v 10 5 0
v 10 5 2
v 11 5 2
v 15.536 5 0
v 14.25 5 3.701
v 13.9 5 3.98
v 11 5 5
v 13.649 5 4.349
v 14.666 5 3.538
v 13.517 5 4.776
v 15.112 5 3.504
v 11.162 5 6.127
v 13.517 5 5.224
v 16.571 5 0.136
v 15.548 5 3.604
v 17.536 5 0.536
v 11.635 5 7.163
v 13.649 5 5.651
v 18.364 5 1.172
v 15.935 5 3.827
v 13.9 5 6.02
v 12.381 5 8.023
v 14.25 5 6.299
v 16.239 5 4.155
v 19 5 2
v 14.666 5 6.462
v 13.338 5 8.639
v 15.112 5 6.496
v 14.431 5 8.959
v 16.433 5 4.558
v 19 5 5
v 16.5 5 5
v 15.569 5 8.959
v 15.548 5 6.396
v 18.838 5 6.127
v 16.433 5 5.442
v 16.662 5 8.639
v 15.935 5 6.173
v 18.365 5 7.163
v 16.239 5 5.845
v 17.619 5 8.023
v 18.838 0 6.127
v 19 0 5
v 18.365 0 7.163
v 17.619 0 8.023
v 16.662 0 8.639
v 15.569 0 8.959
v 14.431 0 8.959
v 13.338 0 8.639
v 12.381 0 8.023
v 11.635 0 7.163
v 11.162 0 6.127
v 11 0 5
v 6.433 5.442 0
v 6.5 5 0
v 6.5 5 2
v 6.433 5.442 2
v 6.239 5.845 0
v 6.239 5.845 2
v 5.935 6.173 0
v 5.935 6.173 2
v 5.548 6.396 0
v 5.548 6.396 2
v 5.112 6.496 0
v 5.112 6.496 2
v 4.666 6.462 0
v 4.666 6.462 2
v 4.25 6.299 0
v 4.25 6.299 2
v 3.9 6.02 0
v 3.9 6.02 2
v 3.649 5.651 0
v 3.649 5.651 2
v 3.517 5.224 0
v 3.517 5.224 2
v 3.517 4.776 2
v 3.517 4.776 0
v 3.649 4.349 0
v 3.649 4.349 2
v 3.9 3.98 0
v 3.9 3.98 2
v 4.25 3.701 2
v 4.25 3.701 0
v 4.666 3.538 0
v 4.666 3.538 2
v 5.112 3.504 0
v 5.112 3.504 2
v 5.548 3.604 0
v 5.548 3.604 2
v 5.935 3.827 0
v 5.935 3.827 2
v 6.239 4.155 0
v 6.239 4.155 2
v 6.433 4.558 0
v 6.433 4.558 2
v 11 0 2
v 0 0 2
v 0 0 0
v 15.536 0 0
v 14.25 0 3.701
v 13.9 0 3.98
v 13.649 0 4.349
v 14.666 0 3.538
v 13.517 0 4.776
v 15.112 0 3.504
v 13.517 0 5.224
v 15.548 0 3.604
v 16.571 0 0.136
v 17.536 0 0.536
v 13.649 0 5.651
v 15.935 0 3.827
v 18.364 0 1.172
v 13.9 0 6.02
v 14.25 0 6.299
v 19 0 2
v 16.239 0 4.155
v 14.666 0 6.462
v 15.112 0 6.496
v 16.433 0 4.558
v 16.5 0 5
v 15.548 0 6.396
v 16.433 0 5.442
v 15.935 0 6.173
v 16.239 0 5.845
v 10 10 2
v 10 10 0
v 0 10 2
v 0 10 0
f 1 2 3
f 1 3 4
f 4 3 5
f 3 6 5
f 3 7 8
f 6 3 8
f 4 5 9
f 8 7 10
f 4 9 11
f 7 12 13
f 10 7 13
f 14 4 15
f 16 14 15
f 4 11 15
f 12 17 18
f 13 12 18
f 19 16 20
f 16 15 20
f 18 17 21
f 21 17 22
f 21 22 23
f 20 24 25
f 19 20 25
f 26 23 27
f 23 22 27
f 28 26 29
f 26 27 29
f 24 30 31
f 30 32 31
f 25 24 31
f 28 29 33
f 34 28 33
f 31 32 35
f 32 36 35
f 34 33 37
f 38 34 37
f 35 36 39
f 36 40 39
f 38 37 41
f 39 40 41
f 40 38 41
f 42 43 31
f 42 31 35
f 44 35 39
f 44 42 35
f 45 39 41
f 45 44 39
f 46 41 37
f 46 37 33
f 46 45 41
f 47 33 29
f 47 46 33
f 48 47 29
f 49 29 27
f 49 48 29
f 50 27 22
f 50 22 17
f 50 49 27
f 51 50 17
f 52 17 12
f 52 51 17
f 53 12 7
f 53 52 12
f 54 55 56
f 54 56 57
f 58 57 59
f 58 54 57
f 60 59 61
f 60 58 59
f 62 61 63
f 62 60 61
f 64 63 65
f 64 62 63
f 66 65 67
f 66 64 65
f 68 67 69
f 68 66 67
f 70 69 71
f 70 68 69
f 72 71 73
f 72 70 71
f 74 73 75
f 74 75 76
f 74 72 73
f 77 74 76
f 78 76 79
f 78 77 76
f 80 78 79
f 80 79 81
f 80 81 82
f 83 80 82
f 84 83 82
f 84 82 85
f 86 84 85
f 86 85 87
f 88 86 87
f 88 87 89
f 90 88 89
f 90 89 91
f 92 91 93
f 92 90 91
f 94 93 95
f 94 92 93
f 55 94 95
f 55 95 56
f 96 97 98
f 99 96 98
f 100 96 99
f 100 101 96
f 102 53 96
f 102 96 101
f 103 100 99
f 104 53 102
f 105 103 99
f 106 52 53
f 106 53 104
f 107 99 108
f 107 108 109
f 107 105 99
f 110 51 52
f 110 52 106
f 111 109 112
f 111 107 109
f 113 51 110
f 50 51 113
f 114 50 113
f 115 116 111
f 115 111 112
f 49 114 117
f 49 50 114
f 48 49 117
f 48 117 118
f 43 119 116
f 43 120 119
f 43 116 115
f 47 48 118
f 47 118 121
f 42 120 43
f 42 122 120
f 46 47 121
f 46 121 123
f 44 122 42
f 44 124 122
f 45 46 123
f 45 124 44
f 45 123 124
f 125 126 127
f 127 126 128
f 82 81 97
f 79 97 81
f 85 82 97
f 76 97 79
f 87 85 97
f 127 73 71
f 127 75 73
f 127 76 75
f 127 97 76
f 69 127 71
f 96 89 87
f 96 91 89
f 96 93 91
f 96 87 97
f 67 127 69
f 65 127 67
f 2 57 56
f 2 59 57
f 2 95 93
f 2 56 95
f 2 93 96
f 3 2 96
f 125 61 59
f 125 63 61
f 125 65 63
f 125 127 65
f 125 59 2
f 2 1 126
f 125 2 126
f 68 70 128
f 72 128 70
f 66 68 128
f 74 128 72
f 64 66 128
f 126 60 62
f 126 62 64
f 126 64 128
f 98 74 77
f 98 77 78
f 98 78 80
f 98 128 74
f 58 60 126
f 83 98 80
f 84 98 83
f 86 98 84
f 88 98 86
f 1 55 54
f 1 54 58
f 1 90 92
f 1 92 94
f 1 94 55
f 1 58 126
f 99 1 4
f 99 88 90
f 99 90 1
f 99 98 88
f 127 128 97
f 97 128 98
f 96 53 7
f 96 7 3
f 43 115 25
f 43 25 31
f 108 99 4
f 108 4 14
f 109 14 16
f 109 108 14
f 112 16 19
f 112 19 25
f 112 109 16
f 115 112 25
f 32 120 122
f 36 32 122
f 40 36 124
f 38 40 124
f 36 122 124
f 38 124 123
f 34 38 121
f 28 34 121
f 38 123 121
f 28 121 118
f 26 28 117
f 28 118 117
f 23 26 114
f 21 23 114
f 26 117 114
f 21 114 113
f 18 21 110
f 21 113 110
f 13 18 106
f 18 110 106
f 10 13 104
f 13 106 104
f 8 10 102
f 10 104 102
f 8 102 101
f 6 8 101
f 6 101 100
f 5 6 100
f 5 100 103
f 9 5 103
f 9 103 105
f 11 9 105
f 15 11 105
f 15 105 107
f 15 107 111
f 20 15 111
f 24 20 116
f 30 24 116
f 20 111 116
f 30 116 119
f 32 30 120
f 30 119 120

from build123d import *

# Parameters (mm, degrees)
ESQUISSE1_R        = 1.5
BOSS_EXTRU_2_DEPTH = 2
ESQUISSE4_R        = 1.5
BOSS_EXTRU_3_DEPTH = 5


with BuildPart() as part:
    # Esquisse1 → Boss.-Extru.2 (new body)
    with BuildSketch(Plane.XY):
        Polygon((0, 0), (15, 0), (15, 5), (10, 5), (10, 10), (0, 10), align=None)
        with Locations((5, 5)):
            Circle(ESQUISSE1_R, mode=Mode.SUBTRACT)
    extrude(amount=BOSS_EXTRU_2_DEPTH)

    # Esquisse4 → Boss.-Extru.3 (add)
    with BuildSketch(Plane.XZ):
        with BuildLine():
            Line((11, 5), (11, 0))
            Line((11, 0), (15.535898385, 0))
            ThreePointArc((15.535898385, 0), (17.535898385, 0.535898385), (19, 2))
            Line((19, 2), (19, 5))
            ThreePointArc((19, 5), (15, 9), (11, 5))
        make_face()
        with Locations((15, 5)):
            Circle(ESQUISSE4_R, mode=Mode.SUBTRACT)
    extrude(amount=-BOSS_EXTRU_3_DEPTH)


solid = part.part
